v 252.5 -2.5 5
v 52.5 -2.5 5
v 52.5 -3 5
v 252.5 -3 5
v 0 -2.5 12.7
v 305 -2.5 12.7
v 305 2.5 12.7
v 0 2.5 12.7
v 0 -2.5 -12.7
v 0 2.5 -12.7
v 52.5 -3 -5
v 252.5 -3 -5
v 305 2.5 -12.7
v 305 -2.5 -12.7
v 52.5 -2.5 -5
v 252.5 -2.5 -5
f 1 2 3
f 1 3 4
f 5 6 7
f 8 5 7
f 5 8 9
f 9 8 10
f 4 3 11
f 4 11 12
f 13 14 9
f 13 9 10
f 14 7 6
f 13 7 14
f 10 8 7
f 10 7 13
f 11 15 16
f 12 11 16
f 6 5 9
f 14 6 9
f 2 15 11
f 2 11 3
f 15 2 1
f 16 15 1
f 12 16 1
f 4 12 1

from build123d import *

# Parameters (mm, degrees)
SKETCH1_W           = 25.4
SKETCH1_H           = 5
BOSS_EXTRUDE1_DEPTH = 305
SKETCH2_W           = 200
SKETCH2_H           = 10
BOSS_EXTRUDE2_DEPTH = 0.5


with BuildPart() as part:
    # Sketch1 → Boss-Extrude1 (new body)
    with BuildSketch(Plane(origin=(0, 0, 0), x_dir=(0, 0, -1), z_dir=(1, 0, 0))):
        Rectangle(SKETCH1_W, SKETCH1_H)
    extrude(amount=BOSS_EXTRUDE1_DEPTH)


with BuildPart() as body_2:
    # Sketch2 → Boss-Extrude2 (new body)
    with BuildSketch(Plane.XZ.offset(2.5)):
        with Locations((152.5, 0)):
            Rectangle(SKETCH2_W, SKETCH2_H)
    extrude(amount=BOSS_EXTRUDE2_DEPTH)


solid = Compound([part.part, body_2.part])
